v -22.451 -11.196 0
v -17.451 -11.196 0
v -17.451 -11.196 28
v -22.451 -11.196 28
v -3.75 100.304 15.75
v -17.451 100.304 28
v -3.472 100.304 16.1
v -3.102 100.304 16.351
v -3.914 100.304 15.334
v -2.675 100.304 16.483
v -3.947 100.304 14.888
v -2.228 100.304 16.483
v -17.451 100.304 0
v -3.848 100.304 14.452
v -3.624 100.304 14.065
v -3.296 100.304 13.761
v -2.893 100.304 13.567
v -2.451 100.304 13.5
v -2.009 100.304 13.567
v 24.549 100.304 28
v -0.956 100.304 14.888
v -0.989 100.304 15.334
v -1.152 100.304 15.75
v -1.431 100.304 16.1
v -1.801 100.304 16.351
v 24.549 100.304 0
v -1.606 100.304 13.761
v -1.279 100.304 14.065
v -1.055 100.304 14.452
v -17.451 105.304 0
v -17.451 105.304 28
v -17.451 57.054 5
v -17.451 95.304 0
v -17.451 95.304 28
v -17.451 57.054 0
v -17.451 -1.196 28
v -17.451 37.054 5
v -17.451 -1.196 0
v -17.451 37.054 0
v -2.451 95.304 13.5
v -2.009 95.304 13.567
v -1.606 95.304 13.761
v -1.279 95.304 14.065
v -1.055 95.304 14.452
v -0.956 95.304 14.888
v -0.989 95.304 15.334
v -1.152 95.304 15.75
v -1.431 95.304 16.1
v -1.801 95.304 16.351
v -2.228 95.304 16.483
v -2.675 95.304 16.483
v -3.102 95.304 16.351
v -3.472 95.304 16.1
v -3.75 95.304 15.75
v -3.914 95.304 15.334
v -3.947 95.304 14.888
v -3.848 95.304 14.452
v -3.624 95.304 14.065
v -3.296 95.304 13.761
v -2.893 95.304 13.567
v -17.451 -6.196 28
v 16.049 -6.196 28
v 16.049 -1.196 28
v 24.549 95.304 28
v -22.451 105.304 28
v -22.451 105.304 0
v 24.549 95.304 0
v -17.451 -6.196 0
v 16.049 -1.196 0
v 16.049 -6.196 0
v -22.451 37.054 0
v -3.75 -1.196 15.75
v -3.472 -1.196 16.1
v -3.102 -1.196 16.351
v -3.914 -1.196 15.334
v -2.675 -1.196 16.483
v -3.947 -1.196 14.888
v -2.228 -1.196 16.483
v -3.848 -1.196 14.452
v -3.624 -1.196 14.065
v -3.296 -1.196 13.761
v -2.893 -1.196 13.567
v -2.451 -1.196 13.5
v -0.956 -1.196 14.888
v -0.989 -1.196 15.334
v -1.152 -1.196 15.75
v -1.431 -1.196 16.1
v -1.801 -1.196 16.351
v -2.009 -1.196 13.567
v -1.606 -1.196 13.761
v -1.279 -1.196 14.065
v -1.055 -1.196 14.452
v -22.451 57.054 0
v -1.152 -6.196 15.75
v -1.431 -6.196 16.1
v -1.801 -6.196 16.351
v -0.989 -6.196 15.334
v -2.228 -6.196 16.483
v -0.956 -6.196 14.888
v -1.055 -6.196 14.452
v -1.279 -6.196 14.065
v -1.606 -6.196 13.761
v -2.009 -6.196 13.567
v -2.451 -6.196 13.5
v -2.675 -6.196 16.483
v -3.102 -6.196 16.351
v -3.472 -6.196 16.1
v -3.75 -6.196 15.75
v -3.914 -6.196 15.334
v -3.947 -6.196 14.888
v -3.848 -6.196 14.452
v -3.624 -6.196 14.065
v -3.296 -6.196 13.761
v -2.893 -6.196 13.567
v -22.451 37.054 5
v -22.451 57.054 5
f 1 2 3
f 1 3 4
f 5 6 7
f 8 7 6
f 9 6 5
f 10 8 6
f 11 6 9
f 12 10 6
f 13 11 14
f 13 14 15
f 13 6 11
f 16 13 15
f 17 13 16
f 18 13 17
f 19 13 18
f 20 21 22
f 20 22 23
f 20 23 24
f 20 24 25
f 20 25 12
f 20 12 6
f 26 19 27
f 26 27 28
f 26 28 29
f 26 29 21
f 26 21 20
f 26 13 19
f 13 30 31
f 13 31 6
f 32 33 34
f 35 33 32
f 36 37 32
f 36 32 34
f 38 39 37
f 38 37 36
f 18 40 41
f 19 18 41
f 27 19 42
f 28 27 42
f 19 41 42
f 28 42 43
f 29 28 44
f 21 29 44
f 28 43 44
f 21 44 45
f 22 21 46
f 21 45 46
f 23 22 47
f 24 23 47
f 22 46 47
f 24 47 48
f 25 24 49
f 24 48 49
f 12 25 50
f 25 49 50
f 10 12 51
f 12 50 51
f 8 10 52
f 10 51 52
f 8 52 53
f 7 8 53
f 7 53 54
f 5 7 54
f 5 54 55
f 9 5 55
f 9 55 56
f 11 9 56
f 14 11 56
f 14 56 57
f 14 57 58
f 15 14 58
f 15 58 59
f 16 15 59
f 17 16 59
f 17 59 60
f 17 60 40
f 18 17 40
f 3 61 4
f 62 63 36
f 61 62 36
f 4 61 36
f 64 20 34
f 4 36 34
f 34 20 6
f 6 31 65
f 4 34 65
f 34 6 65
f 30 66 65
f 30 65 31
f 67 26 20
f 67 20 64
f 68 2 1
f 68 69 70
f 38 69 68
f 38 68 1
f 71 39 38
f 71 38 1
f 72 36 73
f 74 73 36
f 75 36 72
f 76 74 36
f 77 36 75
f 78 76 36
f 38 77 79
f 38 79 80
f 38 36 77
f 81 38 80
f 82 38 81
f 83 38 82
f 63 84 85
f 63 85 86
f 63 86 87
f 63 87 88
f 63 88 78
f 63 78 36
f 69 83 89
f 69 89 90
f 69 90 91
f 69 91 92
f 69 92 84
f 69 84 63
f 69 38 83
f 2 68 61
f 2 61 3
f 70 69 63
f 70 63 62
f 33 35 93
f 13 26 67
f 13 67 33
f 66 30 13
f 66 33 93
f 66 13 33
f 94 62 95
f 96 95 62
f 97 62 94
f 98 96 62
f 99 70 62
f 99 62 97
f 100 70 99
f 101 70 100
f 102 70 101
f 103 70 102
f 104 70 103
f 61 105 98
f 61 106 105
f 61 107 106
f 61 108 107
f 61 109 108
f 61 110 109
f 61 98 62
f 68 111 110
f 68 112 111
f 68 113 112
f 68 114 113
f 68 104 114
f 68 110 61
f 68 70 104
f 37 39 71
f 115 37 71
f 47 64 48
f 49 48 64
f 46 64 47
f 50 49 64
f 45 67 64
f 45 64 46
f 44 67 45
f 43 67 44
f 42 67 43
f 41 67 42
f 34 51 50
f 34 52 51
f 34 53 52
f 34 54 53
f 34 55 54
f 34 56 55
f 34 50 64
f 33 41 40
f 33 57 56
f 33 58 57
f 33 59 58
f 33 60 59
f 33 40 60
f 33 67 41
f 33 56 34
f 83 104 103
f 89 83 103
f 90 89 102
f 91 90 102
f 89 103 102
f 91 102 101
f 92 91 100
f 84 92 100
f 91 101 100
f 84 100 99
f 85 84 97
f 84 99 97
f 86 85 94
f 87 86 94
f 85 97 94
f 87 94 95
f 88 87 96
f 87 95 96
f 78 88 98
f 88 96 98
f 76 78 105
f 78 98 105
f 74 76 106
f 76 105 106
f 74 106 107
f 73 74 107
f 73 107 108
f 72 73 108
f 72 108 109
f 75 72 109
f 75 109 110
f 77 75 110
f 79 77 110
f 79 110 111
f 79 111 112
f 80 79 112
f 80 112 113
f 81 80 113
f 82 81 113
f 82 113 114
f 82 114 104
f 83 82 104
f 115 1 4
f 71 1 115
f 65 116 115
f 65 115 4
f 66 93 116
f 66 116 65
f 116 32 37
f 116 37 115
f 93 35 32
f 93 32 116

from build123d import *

# Parameters (mm, degrees)
EXTRUDE_1_DEPTH     = 28
SKETCH_2_W          = 5
SKETCH_2_H          = 20
CUT_EXTRUDE_1_DEPTH = 5
SKETCH_3_R          = 1.5
CUT_EXTRUDE_2_DEPTH = 118.553755913


with BuildPart() as part:
    # 草圖1 → 填料-伸長1 (new body)
    with BuildSketch(Plane.XY):
        Polygon((-17.451364004, -6.196122823), (-17.451364004, -11.196122823), (-22.451364004, -11.196122823), (-22.451364004, 105.303877177), (-17.451364004, 105.303877177), (-17.451364004, 100.303877177), (24.548635996, 100.303877177), (24.548635996, 95.303877177), (-17.451364004, 95.303877177), (-17.451364004, -1.196122823), (16.048635996, -1.196122823), (16.048635996, -6.196122823), align=None)
    extrude(amount=EXTRUDE_1_DEPTH)

    # 草圖2 → 除料-伸長1 (cut)
    with BuildSketch(Plane(origin=(0, 0, 0), x_dir=(-1, 0, 0), z_dir=(0, 0, -1))):
        with Locations((19.951364004, 47.053877177)):
            Rectangle(SKETCH_2_W, SKETCH_2_H)
    extrude(amount=-CUT_EXTRUDE_1_DEPTH, mode=Mode.SUBTRACT)

    # 草圖3 → 除料-伸長2 (cut, through all)
    with BuildSketch(Plane.XZ.offset(6.196122823)):
        with Locations(Location((-2.451364004, 15, 0), (0, 0, 270))):
            Circle(SKETCH_3_R)
    extrude(amount=-CUT_EXTRUDE_2_DEPTH, mode=Mode.SUBTRACT)


solid = part.part
